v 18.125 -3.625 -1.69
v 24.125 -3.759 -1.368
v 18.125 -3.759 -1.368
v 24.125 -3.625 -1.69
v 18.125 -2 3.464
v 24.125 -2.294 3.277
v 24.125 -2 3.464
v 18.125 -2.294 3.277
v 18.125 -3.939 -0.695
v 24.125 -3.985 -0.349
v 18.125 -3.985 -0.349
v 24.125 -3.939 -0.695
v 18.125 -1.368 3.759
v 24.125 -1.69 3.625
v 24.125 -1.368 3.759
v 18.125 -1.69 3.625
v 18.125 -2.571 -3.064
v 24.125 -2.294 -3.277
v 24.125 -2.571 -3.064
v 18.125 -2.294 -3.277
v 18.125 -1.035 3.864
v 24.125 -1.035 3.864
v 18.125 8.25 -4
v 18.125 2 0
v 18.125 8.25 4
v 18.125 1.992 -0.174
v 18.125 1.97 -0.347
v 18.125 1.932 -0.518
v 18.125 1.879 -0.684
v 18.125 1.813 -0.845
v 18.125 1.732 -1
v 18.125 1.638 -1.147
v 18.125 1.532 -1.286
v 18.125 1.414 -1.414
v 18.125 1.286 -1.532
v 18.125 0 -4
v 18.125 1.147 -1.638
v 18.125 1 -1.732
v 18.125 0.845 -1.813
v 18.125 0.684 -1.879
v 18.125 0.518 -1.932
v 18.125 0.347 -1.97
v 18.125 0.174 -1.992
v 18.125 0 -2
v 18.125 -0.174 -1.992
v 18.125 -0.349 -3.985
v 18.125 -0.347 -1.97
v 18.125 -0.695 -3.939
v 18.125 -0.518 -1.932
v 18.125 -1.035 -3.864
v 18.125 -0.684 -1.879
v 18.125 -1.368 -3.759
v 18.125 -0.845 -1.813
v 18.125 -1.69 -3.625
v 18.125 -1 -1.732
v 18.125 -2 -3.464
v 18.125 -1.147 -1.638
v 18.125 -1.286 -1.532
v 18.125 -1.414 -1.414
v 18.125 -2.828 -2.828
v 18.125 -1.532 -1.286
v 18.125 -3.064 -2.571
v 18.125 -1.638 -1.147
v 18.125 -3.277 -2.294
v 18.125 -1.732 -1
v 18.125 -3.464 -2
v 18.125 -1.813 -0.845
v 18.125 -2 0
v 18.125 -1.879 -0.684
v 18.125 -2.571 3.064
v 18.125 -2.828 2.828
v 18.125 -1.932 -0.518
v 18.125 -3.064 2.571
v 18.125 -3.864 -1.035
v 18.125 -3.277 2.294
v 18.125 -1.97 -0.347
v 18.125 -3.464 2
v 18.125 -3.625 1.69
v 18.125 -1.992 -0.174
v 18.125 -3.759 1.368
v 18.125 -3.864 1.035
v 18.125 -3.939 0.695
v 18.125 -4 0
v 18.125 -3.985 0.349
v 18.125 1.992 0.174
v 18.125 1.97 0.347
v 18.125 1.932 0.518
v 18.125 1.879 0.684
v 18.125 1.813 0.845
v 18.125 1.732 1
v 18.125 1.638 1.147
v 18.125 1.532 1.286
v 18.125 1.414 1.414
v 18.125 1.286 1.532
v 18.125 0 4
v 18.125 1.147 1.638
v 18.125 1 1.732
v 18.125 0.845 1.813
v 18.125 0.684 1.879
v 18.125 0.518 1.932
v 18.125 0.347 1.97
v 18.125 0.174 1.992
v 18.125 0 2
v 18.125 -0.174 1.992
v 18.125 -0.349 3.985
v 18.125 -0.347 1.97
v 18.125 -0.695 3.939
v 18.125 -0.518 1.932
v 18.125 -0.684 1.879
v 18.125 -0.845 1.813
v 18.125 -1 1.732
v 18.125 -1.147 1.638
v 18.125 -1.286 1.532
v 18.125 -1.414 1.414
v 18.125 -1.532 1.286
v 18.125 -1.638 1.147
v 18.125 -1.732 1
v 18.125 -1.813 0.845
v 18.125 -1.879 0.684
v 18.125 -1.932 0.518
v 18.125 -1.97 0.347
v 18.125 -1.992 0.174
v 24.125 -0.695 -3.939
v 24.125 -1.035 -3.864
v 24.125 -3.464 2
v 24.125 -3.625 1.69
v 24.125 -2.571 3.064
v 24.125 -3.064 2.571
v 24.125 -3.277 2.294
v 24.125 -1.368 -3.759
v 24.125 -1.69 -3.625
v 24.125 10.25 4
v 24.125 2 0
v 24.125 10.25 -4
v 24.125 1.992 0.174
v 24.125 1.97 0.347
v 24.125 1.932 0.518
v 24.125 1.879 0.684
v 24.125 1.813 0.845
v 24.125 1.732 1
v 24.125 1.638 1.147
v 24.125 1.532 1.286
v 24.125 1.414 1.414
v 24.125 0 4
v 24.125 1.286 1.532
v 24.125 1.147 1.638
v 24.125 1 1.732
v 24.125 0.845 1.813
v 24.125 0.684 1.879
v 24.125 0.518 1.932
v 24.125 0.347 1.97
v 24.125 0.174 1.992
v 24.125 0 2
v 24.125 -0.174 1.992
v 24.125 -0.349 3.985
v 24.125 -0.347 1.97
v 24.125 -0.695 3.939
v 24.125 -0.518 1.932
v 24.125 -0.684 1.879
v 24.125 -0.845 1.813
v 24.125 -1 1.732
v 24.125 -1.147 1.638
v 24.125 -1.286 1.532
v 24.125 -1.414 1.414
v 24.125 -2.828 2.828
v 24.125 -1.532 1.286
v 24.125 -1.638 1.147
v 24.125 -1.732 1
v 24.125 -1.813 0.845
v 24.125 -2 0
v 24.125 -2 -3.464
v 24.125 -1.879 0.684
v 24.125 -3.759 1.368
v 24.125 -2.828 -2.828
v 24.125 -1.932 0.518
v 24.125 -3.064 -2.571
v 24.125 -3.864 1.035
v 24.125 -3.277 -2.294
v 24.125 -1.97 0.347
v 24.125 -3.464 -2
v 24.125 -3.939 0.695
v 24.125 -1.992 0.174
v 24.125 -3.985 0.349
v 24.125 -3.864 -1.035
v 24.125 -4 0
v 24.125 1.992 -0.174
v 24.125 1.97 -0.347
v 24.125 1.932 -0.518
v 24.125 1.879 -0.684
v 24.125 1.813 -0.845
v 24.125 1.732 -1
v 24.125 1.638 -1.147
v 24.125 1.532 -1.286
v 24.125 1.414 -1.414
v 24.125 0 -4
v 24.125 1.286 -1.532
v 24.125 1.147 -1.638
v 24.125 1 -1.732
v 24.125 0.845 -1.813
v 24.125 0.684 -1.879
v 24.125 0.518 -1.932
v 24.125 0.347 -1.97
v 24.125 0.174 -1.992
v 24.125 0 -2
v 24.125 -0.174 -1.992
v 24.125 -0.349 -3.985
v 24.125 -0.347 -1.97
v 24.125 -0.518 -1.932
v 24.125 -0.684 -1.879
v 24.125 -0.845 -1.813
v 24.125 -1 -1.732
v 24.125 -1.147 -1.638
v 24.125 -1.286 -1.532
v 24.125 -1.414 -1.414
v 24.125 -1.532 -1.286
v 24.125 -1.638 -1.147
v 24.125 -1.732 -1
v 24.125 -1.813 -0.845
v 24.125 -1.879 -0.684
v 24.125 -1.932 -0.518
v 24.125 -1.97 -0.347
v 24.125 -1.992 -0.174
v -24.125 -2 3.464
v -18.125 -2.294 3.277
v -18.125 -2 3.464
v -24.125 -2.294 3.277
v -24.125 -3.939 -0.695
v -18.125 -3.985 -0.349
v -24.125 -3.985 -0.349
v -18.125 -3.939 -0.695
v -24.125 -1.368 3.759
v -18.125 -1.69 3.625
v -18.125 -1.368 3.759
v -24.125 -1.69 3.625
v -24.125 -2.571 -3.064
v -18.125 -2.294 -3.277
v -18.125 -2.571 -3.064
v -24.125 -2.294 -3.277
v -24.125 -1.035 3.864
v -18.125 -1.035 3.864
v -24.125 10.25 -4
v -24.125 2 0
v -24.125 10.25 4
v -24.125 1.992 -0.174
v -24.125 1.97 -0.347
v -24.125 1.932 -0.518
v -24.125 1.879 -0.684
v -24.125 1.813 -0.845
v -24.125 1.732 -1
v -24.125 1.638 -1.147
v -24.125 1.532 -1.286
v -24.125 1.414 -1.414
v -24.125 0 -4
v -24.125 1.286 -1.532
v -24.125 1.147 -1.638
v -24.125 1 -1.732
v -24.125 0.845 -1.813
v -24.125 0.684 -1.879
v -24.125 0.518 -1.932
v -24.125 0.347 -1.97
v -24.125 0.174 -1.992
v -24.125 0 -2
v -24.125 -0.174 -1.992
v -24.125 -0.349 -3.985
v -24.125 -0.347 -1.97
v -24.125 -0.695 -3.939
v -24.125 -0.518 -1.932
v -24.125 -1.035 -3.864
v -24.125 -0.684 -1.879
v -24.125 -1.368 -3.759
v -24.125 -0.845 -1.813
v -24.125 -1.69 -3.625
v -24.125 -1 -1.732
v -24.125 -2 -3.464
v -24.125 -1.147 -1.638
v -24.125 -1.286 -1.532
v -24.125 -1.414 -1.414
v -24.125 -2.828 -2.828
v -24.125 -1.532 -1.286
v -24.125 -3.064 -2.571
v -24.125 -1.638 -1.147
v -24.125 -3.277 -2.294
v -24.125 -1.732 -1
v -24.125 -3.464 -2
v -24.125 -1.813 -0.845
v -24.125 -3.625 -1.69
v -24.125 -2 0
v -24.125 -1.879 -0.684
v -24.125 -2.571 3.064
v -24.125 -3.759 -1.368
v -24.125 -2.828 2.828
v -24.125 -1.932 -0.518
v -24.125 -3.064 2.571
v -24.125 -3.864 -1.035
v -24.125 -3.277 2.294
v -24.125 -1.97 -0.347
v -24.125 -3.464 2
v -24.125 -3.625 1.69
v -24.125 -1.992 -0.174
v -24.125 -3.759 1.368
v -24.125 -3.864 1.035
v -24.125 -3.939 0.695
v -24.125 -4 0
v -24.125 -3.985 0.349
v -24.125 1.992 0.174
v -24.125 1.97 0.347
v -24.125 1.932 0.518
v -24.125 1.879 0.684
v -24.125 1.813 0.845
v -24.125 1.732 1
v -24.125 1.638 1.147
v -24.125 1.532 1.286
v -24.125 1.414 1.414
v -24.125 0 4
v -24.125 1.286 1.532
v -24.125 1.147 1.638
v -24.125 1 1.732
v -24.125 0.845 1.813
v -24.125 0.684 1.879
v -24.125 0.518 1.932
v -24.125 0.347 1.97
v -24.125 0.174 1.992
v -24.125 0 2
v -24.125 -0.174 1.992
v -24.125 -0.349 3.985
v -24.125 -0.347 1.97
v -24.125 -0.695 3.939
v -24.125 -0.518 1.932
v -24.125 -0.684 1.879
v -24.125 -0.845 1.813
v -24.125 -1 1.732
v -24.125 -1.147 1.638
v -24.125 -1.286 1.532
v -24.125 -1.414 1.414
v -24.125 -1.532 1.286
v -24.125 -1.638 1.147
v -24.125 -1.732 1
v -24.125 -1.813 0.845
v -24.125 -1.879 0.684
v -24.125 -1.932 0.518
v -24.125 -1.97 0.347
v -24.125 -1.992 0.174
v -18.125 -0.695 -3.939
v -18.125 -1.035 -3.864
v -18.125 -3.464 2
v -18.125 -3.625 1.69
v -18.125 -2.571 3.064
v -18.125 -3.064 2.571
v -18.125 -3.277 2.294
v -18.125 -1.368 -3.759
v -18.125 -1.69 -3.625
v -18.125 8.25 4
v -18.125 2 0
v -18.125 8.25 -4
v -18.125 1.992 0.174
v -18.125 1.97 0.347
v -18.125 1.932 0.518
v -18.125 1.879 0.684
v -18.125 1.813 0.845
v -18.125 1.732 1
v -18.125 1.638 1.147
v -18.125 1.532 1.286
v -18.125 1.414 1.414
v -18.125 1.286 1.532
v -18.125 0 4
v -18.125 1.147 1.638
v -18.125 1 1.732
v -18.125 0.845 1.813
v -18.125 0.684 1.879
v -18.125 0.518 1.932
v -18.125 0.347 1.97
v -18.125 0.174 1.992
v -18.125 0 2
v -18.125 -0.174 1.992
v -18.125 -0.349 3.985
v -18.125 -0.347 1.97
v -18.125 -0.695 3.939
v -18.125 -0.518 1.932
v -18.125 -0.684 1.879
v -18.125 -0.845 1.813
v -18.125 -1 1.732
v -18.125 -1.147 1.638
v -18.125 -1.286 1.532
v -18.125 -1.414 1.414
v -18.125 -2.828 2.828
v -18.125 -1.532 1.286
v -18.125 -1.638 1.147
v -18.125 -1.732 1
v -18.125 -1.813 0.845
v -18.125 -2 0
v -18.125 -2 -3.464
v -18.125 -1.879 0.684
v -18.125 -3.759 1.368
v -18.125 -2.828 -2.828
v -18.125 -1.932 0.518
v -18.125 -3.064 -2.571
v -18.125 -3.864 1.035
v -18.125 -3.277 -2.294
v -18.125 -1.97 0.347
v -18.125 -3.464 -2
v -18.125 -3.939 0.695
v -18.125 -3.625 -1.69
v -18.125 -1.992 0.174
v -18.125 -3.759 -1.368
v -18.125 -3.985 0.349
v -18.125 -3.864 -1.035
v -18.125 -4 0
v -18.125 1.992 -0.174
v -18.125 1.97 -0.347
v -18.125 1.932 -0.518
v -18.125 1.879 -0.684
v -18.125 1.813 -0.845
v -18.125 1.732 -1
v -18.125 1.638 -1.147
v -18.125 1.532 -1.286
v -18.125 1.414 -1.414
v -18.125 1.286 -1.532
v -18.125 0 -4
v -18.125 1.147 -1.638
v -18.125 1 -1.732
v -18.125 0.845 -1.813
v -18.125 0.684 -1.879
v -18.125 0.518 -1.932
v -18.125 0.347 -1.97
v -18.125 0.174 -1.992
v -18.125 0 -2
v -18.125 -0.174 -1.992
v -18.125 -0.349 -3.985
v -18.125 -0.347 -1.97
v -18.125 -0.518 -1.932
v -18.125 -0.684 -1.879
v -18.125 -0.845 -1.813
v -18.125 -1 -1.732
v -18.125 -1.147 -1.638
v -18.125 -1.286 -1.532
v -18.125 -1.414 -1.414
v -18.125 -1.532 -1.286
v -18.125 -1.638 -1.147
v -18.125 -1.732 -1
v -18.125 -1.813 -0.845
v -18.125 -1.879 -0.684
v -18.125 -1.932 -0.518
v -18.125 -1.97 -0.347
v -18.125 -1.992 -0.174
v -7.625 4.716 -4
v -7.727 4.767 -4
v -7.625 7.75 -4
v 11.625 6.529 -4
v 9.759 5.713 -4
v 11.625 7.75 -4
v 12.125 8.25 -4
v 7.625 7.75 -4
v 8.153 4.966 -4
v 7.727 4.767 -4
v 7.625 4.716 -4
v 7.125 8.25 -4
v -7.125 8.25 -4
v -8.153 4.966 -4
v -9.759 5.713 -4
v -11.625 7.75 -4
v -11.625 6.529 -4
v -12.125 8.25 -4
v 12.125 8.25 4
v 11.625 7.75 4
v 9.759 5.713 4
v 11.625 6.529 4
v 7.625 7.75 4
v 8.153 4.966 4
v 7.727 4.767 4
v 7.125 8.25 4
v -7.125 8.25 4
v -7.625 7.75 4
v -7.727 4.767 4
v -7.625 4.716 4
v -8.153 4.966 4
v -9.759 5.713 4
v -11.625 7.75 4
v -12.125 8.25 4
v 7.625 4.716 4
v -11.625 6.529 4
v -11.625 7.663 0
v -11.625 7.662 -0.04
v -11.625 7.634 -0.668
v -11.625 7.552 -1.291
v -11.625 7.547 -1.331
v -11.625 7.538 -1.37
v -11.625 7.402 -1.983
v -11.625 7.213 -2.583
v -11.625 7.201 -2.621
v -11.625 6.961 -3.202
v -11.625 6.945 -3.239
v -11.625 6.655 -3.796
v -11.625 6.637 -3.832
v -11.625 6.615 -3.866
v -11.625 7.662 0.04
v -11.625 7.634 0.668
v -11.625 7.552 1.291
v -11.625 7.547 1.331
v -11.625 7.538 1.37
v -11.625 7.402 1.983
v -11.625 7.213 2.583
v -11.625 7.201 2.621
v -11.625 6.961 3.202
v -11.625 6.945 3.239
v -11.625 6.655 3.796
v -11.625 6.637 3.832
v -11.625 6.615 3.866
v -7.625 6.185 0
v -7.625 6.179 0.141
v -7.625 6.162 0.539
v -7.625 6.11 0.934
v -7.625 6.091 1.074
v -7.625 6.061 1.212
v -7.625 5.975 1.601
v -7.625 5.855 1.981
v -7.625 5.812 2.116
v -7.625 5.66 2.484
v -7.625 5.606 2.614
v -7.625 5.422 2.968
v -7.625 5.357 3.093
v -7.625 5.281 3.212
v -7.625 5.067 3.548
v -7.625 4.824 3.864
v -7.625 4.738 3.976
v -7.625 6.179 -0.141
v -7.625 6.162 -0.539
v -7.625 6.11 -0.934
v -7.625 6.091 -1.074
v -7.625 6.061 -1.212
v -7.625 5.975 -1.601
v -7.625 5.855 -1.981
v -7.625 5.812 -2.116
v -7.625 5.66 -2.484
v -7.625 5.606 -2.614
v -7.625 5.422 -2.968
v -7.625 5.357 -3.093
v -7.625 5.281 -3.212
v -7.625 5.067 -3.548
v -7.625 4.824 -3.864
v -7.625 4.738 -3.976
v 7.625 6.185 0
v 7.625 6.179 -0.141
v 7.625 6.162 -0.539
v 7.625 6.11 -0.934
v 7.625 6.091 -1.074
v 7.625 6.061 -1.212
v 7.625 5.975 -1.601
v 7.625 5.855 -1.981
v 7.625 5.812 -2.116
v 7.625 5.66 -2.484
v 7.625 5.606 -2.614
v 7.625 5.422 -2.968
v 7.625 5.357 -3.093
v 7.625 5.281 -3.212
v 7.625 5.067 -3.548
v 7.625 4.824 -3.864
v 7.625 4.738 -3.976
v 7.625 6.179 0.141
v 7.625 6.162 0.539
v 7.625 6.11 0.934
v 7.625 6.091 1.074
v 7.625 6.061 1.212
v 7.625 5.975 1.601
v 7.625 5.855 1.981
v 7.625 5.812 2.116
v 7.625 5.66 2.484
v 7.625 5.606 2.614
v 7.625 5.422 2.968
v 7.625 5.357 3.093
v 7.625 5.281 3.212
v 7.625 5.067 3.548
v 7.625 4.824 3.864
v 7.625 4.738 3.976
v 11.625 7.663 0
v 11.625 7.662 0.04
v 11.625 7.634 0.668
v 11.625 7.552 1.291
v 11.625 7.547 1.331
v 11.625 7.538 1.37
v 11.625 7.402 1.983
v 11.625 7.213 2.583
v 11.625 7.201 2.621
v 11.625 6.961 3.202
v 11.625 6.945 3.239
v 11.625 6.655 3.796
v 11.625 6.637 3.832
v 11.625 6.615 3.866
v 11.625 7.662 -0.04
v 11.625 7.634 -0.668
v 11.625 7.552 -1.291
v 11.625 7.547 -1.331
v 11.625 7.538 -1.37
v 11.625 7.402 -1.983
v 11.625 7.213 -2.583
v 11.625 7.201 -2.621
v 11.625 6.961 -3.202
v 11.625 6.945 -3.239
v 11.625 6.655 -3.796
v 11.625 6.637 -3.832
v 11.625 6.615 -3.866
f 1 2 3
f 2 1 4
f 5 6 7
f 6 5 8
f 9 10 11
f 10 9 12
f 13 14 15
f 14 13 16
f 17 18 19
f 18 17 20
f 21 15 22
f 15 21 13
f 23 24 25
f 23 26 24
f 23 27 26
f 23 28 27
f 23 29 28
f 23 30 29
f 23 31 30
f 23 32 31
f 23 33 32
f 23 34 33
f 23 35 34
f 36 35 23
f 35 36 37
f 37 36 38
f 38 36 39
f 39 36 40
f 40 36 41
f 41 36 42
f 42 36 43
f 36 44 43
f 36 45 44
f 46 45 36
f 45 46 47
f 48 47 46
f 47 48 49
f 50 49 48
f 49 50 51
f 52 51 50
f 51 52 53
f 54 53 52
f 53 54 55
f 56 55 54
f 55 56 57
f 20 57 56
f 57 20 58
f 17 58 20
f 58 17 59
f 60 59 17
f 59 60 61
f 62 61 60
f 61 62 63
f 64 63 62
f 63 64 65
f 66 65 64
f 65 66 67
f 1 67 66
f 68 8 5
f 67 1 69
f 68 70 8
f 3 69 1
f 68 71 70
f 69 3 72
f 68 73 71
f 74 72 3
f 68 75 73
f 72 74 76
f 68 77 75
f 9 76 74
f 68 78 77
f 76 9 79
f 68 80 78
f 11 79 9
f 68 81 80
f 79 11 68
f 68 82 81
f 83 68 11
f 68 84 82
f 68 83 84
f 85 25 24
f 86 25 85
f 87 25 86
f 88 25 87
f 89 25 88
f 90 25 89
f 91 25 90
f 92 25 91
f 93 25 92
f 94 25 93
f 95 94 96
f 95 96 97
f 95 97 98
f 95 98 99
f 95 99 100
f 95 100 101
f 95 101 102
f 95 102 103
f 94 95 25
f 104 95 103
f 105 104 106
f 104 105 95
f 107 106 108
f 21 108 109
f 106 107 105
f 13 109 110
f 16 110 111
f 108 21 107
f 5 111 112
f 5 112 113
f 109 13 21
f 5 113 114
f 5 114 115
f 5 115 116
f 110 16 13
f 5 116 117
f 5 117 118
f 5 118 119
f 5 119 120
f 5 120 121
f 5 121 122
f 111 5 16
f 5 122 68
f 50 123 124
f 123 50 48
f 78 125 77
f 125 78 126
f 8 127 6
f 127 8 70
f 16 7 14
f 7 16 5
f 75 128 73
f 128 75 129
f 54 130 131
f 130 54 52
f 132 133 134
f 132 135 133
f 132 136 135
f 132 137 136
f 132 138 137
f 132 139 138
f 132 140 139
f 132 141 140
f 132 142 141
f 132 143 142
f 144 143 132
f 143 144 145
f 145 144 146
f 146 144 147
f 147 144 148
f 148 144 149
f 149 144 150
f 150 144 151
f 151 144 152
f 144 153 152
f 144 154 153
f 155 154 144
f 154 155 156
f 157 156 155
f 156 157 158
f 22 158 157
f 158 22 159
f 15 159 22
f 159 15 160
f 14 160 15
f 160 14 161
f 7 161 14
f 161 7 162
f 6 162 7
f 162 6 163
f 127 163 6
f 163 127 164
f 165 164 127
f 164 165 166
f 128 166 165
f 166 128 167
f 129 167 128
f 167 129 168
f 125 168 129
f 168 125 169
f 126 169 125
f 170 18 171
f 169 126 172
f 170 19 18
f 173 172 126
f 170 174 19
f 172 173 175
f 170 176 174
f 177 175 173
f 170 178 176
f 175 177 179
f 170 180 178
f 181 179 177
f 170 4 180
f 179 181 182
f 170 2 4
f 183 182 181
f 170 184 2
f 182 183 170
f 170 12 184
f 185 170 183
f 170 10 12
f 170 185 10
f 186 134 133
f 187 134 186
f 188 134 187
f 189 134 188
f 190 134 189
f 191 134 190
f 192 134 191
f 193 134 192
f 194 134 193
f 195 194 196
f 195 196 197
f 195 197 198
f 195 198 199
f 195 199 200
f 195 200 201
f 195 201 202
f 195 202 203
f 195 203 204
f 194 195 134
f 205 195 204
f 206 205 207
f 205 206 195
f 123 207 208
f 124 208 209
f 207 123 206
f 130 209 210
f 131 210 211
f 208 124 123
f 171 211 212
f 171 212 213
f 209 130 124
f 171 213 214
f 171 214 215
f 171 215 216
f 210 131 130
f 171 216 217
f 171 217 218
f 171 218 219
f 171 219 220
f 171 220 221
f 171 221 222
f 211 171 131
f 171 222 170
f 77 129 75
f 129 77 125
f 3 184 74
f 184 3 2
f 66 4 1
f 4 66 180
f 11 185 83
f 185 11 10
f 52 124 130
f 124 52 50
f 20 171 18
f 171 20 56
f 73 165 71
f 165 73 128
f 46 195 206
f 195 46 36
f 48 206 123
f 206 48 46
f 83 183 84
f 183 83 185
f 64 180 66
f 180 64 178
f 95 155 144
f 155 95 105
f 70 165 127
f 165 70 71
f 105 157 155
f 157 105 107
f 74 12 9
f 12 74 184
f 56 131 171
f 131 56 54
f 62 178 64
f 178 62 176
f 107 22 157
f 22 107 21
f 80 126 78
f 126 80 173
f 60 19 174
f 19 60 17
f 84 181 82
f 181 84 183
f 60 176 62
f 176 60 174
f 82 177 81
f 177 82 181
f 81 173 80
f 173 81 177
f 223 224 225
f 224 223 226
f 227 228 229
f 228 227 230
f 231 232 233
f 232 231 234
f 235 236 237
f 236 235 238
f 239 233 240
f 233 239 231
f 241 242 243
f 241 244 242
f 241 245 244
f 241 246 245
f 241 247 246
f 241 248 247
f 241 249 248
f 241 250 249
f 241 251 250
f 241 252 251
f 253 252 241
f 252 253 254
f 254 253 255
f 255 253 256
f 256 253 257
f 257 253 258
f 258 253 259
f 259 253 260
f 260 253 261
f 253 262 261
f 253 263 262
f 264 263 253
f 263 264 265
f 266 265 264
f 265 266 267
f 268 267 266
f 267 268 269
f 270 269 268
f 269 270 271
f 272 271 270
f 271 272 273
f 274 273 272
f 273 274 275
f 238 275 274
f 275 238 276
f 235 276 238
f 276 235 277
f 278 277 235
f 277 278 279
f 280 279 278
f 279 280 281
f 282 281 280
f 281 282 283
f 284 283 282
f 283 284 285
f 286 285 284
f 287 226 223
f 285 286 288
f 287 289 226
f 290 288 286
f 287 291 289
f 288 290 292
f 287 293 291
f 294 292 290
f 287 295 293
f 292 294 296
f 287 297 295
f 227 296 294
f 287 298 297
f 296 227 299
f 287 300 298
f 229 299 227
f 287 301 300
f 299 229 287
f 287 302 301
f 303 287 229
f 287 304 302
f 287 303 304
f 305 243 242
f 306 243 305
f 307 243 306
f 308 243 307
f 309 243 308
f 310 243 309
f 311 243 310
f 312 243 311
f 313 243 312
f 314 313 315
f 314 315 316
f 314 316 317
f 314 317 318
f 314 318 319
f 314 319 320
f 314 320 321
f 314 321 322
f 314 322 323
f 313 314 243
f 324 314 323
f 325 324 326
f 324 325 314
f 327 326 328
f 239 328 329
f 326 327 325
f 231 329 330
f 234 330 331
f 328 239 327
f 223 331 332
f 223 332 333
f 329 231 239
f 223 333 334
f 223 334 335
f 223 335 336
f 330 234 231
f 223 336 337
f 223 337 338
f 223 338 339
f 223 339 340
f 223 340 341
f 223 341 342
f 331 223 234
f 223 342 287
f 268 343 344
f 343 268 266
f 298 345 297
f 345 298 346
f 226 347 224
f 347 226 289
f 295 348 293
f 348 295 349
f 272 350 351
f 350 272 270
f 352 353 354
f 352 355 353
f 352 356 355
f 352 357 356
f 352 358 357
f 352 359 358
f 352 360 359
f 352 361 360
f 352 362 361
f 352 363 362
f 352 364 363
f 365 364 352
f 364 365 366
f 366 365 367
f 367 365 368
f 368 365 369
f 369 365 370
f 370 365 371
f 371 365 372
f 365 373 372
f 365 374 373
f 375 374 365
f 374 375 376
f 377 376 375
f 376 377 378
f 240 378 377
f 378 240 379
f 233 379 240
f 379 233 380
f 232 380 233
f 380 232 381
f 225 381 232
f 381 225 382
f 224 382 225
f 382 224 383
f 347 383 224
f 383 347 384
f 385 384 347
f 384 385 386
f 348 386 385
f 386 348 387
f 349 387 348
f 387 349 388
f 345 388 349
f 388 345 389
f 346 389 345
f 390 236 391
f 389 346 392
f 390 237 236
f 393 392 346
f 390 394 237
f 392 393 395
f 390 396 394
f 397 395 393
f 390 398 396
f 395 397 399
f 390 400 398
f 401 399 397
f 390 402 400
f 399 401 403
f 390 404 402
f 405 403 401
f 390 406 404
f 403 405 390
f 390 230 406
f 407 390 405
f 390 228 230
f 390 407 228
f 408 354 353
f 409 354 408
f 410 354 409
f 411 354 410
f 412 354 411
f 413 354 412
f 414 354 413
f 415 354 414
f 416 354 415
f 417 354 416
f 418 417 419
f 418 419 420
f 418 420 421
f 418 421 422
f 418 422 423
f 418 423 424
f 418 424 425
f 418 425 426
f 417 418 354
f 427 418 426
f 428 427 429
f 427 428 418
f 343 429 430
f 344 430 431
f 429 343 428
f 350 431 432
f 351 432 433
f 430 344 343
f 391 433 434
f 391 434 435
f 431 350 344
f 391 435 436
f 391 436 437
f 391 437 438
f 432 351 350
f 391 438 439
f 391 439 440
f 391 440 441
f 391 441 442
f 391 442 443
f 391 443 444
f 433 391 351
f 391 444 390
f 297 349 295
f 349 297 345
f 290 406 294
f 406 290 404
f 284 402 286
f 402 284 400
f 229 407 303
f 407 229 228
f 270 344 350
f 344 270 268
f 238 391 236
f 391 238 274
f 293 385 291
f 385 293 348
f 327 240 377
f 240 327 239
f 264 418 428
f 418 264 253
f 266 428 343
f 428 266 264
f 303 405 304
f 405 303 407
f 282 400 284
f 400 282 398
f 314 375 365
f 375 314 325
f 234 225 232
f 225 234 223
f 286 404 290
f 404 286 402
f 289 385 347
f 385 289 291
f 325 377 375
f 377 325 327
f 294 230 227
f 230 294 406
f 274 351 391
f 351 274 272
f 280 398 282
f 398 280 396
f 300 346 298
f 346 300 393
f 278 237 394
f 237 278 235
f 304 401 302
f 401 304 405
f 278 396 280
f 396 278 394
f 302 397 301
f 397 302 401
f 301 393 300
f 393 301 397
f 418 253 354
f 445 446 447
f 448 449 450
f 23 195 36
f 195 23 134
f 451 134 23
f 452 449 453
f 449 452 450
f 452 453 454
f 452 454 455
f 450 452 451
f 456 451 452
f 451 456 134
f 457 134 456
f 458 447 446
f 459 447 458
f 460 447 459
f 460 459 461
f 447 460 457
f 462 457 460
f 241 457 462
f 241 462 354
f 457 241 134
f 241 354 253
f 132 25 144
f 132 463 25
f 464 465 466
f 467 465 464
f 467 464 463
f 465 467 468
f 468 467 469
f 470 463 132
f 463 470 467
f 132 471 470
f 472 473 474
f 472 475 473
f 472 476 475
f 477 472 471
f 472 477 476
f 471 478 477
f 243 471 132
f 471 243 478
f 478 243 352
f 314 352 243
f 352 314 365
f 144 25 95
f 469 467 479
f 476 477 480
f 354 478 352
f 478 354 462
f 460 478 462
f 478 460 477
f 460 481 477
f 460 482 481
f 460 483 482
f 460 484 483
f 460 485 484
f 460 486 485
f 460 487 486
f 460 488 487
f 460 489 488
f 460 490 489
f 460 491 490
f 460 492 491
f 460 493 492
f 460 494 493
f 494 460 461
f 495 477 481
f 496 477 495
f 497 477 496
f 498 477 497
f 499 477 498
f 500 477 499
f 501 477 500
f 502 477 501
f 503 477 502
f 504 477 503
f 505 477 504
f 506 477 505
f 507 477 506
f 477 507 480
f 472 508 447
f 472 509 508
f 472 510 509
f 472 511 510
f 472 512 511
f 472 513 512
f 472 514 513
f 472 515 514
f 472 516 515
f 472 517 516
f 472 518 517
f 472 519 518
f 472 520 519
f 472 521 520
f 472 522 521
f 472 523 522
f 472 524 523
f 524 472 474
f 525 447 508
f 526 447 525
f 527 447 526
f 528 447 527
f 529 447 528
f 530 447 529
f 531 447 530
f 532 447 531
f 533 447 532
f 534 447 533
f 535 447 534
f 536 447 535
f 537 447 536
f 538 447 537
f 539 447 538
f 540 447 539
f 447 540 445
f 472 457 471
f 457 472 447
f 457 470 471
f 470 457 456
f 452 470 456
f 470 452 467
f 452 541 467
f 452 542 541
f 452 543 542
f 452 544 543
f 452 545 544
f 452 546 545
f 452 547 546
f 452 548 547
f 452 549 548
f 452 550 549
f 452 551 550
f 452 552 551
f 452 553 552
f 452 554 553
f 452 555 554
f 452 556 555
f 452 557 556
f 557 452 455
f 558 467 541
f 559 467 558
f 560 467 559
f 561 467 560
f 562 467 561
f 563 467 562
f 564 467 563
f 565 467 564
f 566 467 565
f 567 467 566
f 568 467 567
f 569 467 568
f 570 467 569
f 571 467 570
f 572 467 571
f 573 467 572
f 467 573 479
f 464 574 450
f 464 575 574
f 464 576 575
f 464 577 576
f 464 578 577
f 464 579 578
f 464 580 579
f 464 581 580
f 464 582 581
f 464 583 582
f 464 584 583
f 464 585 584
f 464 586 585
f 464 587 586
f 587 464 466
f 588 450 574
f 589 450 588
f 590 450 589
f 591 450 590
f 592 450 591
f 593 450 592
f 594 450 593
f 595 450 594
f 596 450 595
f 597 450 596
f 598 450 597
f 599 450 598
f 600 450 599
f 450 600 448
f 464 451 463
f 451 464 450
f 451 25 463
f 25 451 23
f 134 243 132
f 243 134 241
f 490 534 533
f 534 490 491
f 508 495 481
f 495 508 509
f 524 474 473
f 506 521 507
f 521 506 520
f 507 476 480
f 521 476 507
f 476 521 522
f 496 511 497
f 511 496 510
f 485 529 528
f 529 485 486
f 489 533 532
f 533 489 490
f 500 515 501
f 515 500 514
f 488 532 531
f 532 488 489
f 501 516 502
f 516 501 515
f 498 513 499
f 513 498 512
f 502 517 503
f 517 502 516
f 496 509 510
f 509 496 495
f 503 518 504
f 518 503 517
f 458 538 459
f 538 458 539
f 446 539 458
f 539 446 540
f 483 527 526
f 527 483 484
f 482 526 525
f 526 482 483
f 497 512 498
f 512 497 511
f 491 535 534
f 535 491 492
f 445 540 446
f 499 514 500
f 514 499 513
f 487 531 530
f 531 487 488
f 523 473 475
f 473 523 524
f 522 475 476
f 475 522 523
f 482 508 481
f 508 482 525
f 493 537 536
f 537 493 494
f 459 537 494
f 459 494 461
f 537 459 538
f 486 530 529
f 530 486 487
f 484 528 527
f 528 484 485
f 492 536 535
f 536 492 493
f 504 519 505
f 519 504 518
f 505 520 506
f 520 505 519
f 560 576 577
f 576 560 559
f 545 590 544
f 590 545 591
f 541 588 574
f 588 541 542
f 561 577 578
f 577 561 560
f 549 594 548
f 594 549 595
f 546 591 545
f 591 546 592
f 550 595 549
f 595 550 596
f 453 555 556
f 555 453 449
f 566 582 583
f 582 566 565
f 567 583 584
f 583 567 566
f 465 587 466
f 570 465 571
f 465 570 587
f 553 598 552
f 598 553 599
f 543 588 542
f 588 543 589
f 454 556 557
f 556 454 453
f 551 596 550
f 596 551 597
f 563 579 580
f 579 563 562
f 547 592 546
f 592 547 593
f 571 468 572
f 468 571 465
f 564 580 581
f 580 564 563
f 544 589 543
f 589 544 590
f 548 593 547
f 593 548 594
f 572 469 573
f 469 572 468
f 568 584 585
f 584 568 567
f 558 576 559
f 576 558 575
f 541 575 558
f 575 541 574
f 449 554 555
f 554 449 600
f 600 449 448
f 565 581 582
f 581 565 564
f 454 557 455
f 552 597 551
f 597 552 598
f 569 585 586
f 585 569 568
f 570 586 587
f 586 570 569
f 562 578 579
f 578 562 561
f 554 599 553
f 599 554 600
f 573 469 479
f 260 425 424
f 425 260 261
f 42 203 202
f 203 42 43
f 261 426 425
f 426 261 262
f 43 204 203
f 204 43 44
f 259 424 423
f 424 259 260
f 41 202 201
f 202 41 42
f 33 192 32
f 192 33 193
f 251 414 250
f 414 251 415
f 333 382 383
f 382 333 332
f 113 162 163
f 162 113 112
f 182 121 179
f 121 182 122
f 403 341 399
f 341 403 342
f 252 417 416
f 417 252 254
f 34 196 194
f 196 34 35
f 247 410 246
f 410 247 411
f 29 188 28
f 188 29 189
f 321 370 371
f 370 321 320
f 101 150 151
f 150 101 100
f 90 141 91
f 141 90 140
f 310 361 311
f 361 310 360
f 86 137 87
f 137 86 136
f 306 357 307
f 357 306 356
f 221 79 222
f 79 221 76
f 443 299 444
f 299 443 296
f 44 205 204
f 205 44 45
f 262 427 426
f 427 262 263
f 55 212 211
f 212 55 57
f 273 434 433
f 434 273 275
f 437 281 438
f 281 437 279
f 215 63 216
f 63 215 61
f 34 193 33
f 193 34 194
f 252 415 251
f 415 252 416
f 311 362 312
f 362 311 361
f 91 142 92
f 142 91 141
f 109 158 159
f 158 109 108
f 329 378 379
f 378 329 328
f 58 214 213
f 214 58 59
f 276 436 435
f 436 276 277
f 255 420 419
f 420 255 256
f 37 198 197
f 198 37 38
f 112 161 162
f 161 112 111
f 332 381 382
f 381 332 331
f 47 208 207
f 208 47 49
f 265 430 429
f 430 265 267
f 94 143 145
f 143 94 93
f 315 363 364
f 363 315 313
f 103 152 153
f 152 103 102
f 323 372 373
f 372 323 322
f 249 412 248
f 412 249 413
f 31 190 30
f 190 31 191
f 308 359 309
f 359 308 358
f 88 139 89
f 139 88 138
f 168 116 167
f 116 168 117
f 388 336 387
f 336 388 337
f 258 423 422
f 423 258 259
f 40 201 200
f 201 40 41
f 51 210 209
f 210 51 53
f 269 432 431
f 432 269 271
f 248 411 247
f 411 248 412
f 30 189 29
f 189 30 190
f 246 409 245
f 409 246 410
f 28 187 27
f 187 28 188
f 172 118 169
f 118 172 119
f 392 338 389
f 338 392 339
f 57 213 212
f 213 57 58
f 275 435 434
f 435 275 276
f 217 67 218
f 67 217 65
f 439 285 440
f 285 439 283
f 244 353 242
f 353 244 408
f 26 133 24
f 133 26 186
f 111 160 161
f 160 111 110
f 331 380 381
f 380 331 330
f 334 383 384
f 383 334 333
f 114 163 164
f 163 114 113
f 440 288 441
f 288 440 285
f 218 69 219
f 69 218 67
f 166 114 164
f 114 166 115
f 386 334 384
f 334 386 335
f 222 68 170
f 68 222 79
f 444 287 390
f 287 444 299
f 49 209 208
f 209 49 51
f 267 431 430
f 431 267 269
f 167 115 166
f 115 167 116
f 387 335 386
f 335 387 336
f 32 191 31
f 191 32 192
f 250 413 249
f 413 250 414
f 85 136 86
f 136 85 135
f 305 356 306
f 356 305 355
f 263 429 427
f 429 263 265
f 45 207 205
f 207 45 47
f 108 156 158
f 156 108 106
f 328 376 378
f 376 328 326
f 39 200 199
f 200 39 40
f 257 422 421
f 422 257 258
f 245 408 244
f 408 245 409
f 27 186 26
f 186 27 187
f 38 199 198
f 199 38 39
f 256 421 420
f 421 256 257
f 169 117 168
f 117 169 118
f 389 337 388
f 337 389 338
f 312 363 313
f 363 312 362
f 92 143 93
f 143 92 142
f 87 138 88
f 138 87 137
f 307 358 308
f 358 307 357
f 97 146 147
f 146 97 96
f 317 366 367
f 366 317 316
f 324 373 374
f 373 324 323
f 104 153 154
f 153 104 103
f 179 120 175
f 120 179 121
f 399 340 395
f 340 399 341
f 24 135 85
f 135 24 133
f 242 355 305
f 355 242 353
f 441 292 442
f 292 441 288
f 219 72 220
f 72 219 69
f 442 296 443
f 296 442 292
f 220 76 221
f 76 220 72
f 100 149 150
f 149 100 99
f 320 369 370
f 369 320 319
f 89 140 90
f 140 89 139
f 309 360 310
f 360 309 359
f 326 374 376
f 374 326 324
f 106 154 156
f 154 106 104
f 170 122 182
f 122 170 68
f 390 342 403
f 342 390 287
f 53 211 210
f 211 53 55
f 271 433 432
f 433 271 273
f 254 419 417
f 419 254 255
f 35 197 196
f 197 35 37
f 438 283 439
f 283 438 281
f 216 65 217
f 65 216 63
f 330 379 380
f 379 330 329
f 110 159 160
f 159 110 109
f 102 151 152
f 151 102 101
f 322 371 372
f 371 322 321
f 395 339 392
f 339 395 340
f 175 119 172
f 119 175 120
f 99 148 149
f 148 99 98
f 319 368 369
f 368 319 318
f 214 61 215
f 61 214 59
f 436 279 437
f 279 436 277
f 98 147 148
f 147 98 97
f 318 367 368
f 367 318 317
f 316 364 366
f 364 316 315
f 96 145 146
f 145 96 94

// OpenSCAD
TotalLength = 29.425;
MaxRadius = 7.75;
MinRadius = 5;
RopeRadius = 2;
Chamfer = 0.5;
Cap = 1;
HalfSpindleLength = TotalLength/2 - Chamfer - Cap;

$fn = 72;

//translate([0,-20,0])
//Spindle(0);

//Cap(12, true);

//translate([0,-40,0])
Cap(6, false);

module Cap(CapEndThickness, addStopper) {
    CapThickness = 2;
    CapInnerWidth = 36.25;
    CapDepth = 8.25;
    CapOffset = 6.5;
    CapBlockThickness = 4;
    CapChamfer = 1;
    HookOffset = 7;
    HookLength = 14.175; // 28.75/2 to nearest print layer
    
    difference() {
        union () {
            if (addStopper) {
                p1 = Tangent([-(HookLength - HookOffset),CapDepth-2], [0,0], 4, 1);
                echo(p1);
                
                translate([CapInnerWidth/2,CapDepth-2,0])
                    cube([CapEndThickness, CapThickness+2, HookLength]);
                
                color("red")
                translate([CapInnerWidth/2,0,0])
                    rotate([0,90,0])
                        linear_extrude(height=CapEndThickness)
                            polygon([[0,CapDepth],
                                     [-(HookLength - HookOffset),CapDepth-2],
                                     [p1.x,p1.y], [0,0]]);
                
             
                translate([-(CapInnerWidth/2+CapEndThickness),CapDepth-2,0])
                    cube([CapEndThickness, CapThickness+2, HookLength]);
                
                color("red")
                translate([-(CapInnerWidth/2+CapEndThickness),0,0])
                    rotate([0,90,0])
                        linear_extrude(height=CapEndThickness)
                            polygon([[0,CapDepth],
                                     [-(HookLength - HookOffset),CapDepth-2],
                                     [p1.x,p1.y], [0,0]]);
                

                color("green")
                translate([0,CapDepth+2,0])
                    rotate([90,0,0]) {
                        linear_extrude(height=CapThickness)
                            polygon([[CapInnerWidth/2-(CapOffset+CapBlockThickness), 4],
                                     [CapInnerWidth/2,4],
                                     [CapInnerWidth/2, HookLength]]);
                        
                        linear_extrude(height=CapThickness)
                            polygon([[-(CapInnerWidth/2-(CapOffset+CapBlockThickness)), 4],
                                     [-CapInnerWidth/2,4],
                                     [-CapInnerWidth/2, HookLength]]);
                    }
            }
                         
            linear_extrude(height=8, center = true, convexity=10)
                polygon([[-CapInnerWidth/2 - CapEndThickness, CapDepth+CapThickness],
                         [-CapInnerWidth/2 - CapEndThickness, 0],
                         [-CapInnerWidth/2, 0],
                         [-CapInnerWidth/2, CapDepth],
                         [-CapInnerWidth/2, CapDepth],
                         [-CapInnerWidth/2+CapOffset-Chamfer, CapDepth],
                         [-CapInnerWidth/2+CapOffset, CapDepth-Chamfer],
                         [-CapInnerWidth/2+CapOffset, 2],
                         [-CapInnerWidth/2+CapOffset+CapBlockThickness, 2],
                         [-CapInnerWidth/2+CapOffset+CapBlockThickness,
                          CapDepth-Chamfer],
                         [-CapInnerWidth/2+CapOffset+CapBlockThickness+Chamfer,
                          CapDepth],
                         [CapInnerWidth/2-CapOffset-CapBlockThickness-Chamfer,
                          CapDepth],
                         [CapInnerWidth/2-CapOffset-CapBlockThickness,
                          CapDepth-Chamfer],
                         [CapInnerWidth/2-CapOffset-CapBlockThickness, 2],
                         [CapInnerWidth/2-CapOffset, 2],
                         [CapInnerWidth/2-CapOffset, CapDepth-Chamfer],
                         [CapInnerWidth/2-CapOffset+Chamfer, CapDepth],
                         [CapInnerWidth/2, CapDepth],
                         [CapInnerWidth/2, 0],
                         [CapInnerWidth/2+CapEndThickness, 0],
                         [CapInnerWidth/2+CapEndThickness, CapDepth+CapThickness]]);
                         
            rotate([0,90,0]) {
                translate([0,0,CapInnerWidth/2])
                    cylinder(r=4, h=CapEndThickness);
                translate([0,0,-CapInnerWidth/2-CapEndThickness])
                    cylinder(r=4, h=CapEndThickness);
                
            }
                         
        }
        union() {
            rotate([0,90,0]) {
                Spindle(0.5);
            cylinder(r=2, h =100, center=true);
            }
        }
        
    }
    
}


module Spindle(dr) {
    Mid = Tangent([HalfSpindleLength, MaxRadius+dr],
                  [0,MinRadius+dr], RopeRadius, -1);
    
    difference() {
        translate([0,0,-TotalLength/2]) {
            union () {
                translate([0,0,1])
                    cylinder(r=Mid.y, h=TotalLength-1);        
                cylinder(r1=MaxRadius-Chamfer+dr, r2=MaxRadius+dr, h=Chamfer);
                
                translate([0,0,Chamfer])
                    cylinder(r=MaxRadius+dr, h=Cap);
                
                translate([0,0,Chamfer+Cap])
                    cylinder(r1=MaxRadius+dr, r2=Mid.y,
                             h=HalfSpindleLength-Mid.x);
                
                translate([0,0,TotalLength/2+Mid.x ])
                    cylinder(r1=Mid.y, r2=MaxRadius+dr,
                             h=HalfSpindleLength-Mid.x);
                
                translate([0,0,TotalLength - Chamfer - Cap])
                    cylinder(r=MaxRadius+dr, h=Cap);
                translate([0,0,TotalLength - Chamfer])
                    cylinder(r1=MaxRadius+dr, r2=MaxRadius-Chamfer+dr,
                             h=Chamfer);
            }
        }
        union() {
            translate([0,0,-TotalLength/2 - Chamfer])
                cylinder(r1 = 2 + 2 * Chamfer, r2 = 2, h = 2 * Chamfer);
            translate([0,0,TotalLength/2 - Chamfer])
                cylinder(r1 = 2, r2 = 2 + 2 * Chamfer, h = 2 * Chamfer);
            cylinder(r=2,h=100,center=true);
            Torus(MinRadius+dr, RopeRadius);
        }   
        
    }
}

module Torus(r1, r2) {    
    rotate_extrude(angle = 360)
        translate([r1,0])
            circle(r=r2);
    
}



function Tangent(p, center, r, s) =
     let(dx = (p.x - center.x))
     let(dy = (p.y - center.y))
     let(distance2 = dx*dx + dy*dy)
     let(distance = sqrt(distance2))
     let(angleA = atan2(dy, dx))
     let(angleB = acos(r/distance))
        [center.x + cos(angleA + angleB * s) * r,
         center.y + sin(angleA + angleB * s) * r];
